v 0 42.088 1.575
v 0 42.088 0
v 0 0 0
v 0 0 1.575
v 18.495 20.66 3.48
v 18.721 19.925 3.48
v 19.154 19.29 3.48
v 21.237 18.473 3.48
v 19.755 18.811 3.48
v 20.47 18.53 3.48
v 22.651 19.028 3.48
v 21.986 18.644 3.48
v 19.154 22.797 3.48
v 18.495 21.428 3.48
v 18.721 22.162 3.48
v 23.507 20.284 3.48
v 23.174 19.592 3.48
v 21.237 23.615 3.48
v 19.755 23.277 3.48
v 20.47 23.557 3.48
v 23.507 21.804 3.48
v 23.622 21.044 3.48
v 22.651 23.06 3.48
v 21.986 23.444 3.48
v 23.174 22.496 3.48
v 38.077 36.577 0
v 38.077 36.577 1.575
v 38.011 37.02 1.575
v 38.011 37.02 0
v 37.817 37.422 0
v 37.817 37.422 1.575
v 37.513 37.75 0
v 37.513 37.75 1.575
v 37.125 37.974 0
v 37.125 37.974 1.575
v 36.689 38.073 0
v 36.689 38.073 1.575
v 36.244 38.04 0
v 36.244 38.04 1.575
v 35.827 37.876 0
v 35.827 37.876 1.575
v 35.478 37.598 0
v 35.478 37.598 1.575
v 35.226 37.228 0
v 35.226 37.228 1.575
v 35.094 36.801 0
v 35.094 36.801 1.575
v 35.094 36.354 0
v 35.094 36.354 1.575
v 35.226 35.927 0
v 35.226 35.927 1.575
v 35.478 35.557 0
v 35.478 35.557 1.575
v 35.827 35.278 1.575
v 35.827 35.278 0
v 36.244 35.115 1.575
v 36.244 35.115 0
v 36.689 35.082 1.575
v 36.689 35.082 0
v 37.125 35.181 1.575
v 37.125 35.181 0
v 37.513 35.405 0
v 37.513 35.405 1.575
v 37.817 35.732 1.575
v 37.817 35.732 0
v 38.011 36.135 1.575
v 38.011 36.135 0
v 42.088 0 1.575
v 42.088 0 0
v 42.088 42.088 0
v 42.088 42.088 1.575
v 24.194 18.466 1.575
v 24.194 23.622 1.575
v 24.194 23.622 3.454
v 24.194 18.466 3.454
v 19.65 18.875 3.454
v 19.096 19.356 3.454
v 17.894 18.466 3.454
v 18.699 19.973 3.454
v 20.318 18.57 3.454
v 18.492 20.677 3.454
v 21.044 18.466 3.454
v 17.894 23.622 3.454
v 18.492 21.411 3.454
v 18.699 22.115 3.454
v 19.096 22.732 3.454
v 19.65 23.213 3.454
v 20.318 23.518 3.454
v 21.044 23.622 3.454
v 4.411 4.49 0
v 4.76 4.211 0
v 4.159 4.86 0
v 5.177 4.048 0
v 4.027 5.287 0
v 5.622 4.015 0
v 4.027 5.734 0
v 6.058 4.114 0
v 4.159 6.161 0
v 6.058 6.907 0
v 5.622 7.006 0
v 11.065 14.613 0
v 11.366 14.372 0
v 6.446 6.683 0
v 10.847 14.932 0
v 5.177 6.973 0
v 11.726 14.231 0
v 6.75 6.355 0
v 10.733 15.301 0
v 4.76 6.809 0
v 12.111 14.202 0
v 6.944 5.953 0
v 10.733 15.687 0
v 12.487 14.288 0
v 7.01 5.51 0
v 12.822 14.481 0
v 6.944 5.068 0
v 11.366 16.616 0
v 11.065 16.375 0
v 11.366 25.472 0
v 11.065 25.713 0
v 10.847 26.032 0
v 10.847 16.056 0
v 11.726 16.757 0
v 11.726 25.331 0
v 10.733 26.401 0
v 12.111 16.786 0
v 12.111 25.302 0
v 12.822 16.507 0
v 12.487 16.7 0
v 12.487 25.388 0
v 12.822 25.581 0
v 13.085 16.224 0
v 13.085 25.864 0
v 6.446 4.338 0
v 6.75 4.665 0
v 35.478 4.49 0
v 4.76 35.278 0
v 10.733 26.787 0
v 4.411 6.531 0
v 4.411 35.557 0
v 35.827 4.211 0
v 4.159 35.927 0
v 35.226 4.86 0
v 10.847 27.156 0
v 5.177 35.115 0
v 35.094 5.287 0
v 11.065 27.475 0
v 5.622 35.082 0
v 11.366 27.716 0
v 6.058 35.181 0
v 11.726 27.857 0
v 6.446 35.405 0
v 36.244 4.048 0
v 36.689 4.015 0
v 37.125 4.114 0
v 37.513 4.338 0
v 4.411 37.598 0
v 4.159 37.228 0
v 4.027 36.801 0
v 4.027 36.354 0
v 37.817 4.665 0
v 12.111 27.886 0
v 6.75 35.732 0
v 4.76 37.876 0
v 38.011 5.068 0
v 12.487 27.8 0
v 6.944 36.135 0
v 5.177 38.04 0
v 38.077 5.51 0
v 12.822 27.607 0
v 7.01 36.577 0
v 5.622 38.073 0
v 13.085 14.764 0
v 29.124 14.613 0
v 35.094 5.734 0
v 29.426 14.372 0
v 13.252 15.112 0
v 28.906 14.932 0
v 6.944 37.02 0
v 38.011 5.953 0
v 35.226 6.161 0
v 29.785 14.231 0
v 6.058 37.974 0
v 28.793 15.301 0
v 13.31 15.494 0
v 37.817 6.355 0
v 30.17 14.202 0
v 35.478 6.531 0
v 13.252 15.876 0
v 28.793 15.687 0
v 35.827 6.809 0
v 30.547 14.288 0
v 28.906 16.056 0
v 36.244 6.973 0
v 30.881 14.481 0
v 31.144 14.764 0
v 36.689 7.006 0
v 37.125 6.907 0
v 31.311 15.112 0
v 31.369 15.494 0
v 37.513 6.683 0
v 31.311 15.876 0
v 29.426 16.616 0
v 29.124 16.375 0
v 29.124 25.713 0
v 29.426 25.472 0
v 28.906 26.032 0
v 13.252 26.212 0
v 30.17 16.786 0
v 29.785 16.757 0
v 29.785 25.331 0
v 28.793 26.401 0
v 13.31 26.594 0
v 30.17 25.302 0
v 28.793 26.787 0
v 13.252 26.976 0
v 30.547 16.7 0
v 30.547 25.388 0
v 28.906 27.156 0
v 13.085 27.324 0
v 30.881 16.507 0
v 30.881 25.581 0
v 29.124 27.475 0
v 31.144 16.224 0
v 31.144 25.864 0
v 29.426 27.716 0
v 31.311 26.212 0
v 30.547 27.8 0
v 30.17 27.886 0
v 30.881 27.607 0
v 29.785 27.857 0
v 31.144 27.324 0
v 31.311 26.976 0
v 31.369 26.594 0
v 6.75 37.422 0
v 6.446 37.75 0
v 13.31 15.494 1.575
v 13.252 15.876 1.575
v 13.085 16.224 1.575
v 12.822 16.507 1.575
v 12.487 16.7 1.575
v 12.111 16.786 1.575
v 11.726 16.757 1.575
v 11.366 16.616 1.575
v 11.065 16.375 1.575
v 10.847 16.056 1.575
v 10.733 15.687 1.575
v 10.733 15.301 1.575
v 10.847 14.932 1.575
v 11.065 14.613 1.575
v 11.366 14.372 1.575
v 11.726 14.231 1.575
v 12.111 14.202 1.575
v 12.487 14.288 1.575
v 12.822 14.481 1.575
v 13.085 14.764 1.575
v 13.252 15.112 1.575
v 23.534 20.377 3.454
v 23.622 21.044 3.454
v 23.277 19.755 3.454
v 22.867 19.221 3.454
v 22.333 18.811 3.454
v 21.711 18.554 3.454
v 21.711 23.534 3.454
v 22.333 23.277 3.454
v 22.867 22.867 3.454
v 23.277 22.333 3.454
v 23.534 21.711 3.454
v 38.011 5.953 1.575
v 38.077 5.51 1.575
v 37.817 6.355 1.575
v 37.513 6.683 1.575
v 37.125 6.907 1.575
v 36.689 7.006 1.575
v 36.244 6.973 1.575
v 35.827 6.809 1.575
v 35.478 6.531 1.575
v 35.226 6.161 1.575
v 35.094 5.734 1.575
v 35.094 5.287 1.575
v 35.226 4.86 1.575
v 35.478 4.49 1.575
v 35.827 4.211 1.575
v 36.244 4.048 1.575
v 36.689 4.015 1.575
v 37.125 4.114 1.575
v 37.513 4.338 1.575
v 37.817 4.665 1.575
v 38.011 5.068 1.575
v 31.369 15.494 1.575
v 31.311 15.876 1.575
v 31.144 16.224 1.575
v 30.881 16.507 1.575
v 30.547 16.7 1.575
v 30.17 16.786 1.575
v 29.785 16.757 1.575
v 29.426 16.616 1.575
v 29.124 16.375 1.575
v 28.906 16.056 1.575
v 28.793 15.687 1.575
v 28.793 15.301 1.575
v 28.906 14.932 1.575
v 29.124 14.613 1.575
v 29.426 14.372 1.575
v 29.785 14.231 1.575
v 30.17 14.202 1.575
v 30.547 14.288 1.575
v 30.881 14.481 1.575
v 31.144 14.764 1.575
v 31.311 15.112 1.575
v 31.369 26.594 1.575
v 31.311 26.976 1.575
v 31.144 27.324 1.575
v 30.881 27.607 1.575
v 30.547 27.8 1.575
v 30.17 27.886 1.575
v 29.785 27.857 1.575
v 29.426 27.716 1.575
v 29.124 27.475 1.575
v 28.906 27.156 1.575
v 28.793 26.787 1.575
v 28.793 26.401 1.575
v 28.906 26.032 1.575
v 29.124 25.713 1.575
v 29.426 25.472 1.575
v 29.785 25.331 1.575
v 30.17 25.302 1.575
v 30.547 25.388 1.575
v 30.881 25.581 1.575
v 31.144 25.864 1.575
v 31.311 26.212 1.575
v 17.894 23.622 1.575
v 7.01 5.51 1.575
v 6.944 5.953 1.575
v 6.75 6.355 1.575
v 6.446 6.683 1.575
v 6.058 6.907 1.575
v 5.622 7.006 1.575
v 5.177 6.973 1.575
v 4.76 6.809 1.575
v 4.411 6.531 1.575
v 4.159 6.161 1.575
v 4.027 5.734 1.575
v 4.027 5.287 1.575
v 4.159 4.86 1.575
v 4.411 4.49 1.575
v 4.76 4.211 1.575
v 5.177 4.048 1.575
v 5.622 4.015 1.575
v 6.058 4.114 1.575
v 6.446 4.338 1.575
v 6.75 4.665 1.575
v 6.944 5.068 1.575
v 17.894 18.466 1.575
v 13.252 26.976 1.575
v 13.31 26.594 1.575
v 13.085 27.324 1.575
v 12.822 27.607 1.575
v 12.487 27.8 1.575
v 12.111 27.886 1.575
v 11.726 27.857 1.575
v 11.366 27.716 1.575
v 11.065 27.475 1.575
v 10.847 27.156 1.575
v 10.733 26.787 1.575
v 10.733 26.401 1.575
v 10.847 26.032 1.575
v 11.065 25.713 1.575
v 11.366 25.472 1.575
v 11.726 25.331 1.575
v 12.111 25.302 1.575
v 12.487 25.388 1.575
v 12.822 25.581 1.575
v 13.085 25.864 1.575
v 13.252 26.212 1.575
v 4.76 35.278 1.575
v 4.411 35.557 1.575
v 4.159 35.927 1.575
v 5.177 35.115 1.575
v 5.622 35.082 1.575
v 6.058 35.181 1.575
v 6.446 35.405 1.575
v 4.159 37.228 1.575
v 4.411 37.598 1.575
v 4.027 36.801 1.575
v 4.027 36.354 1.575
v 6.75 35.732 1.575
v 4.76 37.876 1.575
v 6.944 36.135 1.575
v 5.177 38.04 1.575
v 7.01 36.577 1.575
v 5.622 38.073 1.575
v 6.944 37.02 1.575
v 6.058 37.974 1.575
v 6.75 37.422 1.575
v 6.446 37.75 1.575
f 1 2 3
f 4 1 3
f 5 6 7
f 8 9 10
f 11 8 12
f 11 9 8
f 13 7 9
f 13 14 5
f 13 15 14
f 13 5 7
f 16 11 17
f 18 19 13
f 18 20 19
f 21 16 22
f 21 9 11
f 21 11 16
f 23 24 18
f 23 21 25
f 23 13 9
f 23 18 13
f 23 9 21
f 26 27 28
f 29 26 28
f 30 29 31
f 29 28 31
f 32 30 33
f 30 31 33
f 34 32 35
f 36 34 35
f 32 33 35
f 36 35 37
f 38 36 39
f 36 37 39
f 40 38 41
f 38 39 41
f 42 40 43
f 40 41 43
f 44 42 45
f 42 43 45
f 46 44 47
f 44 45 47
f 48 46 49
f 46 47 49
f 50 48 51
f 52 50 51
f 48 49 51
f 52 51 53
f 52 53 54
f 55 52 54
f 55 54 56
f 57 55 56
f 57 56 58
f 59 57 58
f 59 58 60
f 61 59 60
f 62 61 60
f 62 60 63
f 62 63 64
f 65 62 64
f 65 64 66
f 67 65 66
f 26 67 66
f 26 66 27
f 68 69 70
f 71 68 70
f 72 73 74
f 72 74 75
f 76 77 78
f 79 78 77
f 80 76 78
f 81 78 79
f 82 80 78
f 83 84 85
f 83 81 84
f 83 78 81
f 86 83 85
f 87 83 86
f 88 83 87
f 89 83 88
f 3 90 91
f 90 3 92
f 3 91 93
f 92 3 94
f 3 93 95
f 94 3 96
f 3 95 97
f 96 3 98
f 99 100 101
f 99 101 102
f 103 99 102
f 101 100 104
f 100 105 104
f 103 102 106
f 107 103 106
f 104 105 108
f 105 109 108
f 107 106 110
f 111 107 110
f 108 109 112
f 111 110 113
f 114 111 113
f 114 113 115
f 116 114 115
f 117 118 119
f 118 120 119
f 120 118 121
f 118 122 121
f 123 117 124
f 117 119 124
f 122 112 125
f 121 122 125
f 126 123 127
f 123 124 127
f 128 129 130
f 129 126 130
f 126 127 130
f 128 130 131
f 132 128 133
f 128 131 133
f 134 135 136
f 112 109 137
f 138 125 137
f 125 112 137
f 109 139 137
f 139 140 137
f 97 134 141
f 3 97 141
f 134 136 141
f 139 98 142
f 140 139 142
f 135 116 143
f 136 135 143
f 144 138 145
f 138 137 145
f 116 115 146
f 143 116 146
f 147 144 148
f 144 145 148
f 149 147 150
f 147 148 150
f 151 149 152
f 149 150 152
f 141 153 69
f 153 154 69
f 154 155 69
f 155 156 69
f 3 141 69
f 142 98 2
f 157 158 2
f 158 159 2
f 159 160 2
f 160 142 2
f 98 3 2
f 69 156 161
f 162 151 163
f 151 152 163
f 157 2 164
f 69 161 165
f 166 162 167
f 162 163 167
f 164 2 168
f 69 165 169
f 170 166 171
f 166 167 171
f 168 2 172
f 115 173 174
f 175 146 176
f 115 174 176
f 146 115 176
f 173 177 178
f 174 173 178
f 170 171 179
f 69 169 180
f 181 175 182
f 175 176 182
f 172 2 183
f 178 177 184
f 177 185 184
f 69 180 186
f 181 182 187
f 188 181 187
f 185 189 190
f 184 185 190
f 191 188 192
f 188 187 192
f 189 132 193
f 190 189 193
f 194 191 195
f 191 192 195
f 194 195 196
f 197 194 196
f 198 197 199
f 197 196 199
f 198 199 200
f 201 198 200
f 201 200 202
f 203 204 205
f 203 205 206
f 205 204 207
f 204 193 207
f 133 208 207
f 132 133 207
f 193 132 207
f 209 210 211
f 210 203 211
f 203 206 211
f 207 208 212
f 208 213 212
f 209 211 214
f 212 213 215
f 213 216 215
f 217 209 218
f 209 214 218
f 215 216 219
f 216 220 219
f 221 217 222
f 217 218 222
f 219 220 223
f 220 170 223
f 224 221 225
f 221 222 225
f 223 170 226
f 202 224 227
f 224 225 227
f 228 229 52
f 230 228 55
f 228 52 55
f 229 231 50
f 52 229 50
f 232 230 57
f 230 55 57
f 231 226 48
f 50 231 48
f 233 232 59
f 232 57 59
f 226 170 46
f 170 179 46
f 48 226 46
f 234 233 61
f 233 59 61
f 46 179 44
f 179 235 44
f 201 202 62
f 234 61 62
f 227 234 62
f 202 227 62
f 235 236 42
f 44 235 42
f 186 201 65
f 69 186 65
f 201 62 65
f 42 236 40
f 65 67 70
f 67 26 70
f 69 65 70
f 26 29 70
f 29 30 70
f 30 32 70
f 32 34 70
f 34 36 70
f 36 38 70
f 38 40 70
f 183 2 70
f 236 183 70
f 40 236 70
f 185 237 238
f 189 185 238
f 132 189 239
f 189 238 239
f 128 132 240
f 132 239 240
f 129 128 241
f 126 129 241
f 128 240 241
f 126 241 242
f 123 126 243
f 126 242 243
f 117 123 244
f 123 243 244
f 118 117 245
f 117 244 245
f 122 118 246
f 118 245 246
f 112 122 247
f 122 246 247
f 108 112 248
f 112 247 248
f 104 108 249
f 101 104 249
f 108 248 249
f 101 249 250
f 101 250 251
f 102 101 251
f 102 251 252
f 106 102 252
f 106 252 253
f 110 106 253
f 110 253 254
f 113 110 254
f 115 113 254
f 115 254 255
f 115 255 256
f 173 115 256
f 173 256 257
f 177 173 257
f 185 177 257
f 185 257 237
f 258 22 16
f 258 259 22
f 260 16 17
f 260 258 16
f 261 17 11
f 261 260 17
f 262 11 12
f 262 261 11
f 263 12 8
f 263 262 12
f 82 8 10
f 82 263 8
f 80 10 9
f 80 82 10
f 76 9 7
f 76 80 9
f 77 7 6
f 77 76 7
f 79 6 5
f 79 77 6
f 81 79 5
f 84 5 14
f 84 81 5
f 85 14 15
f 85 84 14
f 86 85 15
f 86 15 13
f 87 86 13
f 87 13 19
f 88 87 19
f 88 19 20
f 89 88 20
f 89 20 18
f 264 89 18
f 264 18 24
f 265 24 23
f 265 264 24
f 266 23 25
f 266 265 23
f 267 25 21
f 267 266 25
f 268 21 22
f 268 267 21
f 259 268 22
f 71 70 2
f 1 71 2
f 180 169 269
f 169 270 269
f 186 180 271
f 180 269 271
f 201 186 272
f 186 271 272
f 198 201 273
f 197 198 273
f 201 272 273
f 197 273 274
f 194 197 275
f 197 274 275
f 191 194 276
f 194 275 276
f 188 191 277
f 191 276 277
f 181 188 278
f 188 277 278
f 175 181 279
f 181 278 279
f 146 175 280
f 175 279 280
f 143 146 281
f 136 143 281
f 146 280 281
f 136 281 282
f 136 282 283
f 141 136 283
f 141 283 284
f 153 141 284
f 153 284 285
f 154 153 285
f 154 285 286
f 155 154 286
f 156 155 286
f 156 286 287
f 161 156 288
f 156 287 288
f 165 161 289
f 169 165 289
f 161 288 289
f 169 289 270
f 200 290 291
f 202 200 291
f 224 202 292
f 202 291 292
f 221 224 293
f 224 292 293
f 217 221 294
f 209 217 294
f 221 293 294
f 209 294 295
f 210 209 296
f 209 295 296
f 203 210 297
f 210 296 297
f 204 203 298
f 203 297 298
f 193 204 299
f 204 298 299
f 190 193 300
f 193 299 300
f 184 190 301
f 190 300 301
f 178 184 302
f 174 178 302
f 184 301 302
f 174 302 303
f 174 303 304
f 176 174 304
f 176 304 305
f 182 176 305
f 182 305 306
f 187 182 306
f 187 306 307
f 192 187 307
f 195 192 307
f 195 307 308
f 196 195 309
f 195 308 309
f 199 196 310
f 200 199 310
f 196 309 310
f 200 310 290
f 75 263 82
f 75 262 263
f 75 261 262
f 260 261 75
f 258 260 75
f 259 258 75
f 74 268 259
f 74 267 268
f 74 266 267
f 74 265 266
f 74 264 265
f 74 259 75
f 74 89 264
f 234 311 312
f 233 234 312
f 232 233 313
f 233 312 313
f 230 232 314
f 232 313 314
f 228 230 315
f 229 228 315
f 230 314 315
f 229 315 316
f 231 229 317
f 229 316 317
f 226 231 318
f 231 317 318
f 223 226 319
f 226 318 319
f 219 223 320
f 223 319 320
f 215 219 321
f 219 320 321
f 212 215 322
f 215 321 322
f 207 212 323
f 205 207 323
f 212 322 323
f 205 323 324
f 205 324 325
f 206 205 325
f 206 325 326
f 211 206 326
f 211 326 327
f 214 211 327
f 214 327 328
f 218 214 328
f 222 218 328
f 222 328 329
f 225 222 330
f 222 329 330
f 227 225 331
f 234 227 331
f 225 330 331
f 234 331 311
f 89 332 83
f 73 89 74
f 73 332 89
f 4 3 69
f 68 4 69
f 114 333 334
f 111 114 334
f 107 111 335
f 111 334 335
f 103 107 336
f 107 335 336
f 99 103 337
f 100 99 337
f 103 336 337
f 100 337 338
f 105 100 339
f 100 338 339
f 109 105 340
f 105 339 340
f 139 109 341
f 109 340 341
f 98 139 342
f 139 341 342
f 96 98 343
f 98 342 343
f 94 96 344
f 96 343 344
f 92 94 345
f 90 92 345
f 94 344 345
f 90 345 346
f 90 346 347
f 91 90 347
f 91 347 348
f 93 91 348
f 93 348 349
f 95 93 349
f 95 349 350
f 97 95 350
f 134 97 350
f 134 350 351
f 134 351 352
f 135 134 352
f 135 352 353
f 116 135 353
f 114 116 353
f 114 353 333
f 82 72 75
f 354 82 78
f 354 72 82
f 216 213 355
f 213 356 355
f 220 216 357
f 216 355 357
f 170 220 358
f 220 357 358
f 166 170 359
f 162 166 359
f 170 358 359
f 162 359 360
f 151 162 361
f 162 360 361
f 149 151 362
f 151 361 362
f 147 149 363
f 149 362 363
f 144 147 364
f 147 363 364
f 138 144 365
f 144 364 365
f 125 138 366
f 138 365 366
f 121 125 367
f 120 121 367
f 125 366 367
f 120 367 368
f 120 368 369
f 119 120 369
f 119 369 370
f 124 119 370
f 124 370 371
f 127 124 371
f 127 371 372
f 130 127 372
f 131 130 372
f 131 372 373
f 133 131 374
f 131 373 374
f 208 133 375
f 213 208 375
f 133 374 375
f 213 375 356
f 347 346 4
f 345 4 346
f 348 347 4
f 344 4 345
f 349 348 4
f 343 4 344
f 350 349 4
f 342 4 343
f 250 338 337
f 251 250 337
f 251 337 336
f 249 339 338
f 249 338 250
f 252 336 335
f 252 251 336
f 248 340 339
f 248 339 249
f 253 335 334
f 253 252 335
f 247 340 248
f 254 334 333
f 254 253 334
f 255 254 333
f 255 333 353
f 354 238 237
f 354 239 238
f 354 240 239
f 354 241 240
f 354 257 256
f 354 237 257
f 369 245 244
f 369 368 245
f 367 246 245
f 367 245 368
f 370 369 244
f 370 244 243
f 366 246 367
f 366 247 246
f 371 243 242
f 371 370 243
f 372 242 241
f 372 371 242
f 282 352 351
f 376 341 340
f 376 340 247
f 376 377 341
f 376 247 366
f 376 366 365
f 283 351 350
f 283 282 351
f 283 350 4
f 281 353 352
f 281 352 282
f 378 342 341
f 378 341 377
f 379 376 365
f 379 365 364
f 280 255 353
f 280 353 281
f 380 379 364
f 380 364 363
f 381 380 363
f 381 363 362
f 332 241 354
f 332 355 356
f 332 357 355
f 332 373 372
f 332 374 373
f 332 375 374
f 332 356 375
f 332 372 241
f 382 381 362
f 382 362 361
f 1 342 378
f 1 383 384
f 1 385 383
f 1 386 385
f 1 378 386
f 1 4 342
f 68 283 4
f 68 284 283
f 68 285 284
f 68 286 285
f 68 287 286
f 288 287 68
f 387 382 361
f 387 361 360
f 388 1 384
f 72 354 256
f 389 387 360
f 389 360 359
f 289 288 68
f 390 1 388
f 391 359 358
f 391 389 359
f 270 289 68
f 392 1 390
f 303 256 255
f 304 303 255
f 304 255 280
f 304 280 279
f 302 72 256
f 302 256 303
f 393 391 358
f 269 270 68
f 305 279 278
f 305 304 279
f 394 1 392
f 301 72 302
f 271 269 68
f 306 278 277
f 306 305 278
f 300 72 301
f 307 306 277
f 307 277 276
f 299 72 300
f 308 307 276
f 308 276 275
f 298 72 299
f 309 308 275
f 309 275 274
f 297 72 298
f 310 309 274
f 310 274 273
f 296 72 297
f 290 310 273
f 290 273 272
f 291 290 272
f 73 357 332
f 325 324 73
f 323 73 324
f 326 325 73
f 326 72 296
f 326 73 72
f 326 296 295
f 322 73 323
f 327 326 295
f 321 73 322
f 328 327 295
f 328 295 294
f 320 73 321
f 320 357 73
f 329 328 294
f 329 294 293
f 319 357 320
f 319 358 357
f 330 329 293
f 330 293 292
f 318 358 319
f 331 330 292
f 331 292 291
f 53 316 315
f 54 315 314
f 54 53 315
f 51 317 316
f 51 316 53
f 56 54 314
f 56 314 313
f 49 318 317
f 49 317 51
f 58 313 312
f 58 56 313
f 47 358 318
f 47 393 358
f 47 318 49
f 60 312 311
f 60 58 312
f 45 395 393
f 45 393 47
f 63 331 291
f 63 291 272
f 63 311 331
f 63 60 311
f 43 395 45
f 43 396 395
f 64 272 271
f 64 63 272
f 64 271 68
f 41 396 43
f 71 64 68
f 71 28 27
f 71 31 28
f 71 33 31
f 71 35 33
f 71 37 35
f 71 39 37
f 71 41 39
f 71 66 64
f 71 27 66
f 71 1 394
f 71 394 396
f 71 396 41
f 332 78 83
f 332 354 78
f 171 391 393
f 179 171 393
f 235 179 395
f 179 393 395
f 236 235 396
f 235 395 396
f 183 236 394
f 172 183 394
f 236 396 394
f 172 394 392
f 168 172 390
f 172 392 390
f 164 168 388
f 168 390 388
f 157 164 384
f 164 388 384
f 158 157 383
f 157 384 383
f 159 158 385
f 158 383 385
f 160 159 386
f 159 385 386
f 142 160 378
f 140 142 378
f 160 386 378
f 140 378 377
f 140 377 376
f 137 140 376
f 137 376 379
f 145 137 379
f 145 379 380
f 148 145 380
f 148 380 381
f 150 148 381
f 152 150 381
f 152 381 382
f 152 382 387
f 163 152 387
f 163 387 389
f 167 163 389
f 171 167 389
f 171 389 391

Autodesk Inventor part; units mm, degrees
ref_plane "YZ Plane" through (0, 0, 0) normal (1, 0, 0) x (0, 1, 0)
ref_plane "XZ Plane" through (0, 0, 0) normal (0, 1, 0) x (-1, 0, 0)
ref_plane "XY Plane" through (0, 0, 0) normal (0, 0, 1) x (1, 0, 0)
sketch "Sketch1" plane through (0, 0, 0) normal (0, 0, 1) x (1, 0, 0)
  line L0 (0, 0) -> (42.0878, 0)
  line L1 (42.0878, 0) -> (42.0878, 42.0878)
  line L2 (42.0878, 42.0878) -> (0, 42.0878)
  line L3 (0, 42.0878) -> (0, 0)
  dimension "d0" = 42.0878
  dimension "d1" = 42.0878
extrude "Extrusion1" add sketch "Sketch1" along normal blind 1.5748
sketch "Sketch2" plane through (0, 0, 1.5748) normal (0, 0, 1) x (1, 0, 0)
  line L0 (0, 0) -> (42.0878, 0) projected
  line L1 (42.0878, 0) -> (42.0878, 42.0878) projected
  line L2 (42.0878, 42.0878) -> (0, 42.0878) projected
  line L3 (0, 42.0878) -> (0, 0) projected
  circle A0 centre (5.5104, 36.5774) radius 1.5
  circle A1 centre (36.5774, 36.5774) radius 1.5
  circle A2 centre (36.5774, 5.5104) radius 1.5
  circle A3 centre (5.5104, 5.5104) radius 1.5
  circle A4 centre (12.0142, 26.5938) radius 1.2954
  circle A5 centre (30.0736, 26.5938) radius 1.2954
  circle A6 centre (12.0142, 15.494) radius 1.2954
  circle A7 centre (30.0736, 15.494) radius 1.2954
  dimension "d4" = 3
  dimension "d5" = 2.5908
  dimension "d6" = 28.067
  dimension "d7" = 4.0104
  dimension "d8" = 4.0104
  dimension "d9" = 28.067
  dimension "d10" = 4.0104
  dimension "d11" = 15.4686
  dimension "d12" = 8.509
  dimension "d13" = 10.7188
  dimension "d14" = 10.7188
  dimension "d15" = 14.1986
  dimension "d16" = 14.1986
extrude "Extrusion2" cut sketch "Sketch2" against normal through all contours A0 | A1 | A2 | A3 | A4 | A5 | A6 | A7
sketch "Sketch3" plane through (0, 0, 1.5748) normal (0, 0, 1) x (1, 0, 0)
  line L0 (0, 0) -> (42.0878, 0) projected
  line L1 (42.0878, 0) -> (42.0878, 42.0878) projected
  line L2 (42.0878, 42.0878) -> (0, 42.0878) projected
  line L3 (0, 42.0878) -> (0, 0) projected
  line L4 (17.8943, 23.622) -> (24.1935, 23.622)
  line L5 (24.1935, 23.622) -> (24.1935, 18.4658)
  line L6 (24.1935, 18.4658) -> (17.8943, 18.4658)
  line L7 (17.8943, 18.4658) -> (17.8943, 23.622)
  dimension "d19" = 6.2992
  dimension "d20" = 5.1562
  dimension "d21" = 18.4658
  dimension "d22" = 18.4658
  dimension "d23" = 17.8943
  dimension "d24" = 17.8943
extrude "Extrusion3" add sketch "Sketch3" along normal blind 1.8796 contours L4 L5 L6 L7
sketch "Sketch4" plane through (0, 0, 3.4544) normal (0, 0, 1) x (1, 0, 0)
  line L0 (24.1935, 23.622) -> (17.8943, 23.622) projected
  line L1 (17.8943, 23.622) -> (17.8943, 18.4658) projected
  line L2 (17.8943, 18.4658) -> (24.1935, 18.4658) projected
  line L3 (24.1935, 18.4658) -> (24.1935, 23.622) projected
  circle A0 centre (21.0439, 21.0439) radius 2.5781
  point P0 (0, 0)
  dimension "d27" = 3.1496
  dimension "d28" = 3.1496
extrude "Extrusion4" add sketch "Sketch4" along normal blind 0.0254 contours A0
equation "\"d1\" = d0"
equation "\"d7\" = d8"
equation "\"d9\" = d6"
equation "\"d10\" = d8"
equation "\"d13\" = d14"
equation "\"d15\" = d16"
equation "\"d21\" = d22"
equation "\"d23\" = d24"
equation "\"d27\" = d28"
properties part number "Board"
